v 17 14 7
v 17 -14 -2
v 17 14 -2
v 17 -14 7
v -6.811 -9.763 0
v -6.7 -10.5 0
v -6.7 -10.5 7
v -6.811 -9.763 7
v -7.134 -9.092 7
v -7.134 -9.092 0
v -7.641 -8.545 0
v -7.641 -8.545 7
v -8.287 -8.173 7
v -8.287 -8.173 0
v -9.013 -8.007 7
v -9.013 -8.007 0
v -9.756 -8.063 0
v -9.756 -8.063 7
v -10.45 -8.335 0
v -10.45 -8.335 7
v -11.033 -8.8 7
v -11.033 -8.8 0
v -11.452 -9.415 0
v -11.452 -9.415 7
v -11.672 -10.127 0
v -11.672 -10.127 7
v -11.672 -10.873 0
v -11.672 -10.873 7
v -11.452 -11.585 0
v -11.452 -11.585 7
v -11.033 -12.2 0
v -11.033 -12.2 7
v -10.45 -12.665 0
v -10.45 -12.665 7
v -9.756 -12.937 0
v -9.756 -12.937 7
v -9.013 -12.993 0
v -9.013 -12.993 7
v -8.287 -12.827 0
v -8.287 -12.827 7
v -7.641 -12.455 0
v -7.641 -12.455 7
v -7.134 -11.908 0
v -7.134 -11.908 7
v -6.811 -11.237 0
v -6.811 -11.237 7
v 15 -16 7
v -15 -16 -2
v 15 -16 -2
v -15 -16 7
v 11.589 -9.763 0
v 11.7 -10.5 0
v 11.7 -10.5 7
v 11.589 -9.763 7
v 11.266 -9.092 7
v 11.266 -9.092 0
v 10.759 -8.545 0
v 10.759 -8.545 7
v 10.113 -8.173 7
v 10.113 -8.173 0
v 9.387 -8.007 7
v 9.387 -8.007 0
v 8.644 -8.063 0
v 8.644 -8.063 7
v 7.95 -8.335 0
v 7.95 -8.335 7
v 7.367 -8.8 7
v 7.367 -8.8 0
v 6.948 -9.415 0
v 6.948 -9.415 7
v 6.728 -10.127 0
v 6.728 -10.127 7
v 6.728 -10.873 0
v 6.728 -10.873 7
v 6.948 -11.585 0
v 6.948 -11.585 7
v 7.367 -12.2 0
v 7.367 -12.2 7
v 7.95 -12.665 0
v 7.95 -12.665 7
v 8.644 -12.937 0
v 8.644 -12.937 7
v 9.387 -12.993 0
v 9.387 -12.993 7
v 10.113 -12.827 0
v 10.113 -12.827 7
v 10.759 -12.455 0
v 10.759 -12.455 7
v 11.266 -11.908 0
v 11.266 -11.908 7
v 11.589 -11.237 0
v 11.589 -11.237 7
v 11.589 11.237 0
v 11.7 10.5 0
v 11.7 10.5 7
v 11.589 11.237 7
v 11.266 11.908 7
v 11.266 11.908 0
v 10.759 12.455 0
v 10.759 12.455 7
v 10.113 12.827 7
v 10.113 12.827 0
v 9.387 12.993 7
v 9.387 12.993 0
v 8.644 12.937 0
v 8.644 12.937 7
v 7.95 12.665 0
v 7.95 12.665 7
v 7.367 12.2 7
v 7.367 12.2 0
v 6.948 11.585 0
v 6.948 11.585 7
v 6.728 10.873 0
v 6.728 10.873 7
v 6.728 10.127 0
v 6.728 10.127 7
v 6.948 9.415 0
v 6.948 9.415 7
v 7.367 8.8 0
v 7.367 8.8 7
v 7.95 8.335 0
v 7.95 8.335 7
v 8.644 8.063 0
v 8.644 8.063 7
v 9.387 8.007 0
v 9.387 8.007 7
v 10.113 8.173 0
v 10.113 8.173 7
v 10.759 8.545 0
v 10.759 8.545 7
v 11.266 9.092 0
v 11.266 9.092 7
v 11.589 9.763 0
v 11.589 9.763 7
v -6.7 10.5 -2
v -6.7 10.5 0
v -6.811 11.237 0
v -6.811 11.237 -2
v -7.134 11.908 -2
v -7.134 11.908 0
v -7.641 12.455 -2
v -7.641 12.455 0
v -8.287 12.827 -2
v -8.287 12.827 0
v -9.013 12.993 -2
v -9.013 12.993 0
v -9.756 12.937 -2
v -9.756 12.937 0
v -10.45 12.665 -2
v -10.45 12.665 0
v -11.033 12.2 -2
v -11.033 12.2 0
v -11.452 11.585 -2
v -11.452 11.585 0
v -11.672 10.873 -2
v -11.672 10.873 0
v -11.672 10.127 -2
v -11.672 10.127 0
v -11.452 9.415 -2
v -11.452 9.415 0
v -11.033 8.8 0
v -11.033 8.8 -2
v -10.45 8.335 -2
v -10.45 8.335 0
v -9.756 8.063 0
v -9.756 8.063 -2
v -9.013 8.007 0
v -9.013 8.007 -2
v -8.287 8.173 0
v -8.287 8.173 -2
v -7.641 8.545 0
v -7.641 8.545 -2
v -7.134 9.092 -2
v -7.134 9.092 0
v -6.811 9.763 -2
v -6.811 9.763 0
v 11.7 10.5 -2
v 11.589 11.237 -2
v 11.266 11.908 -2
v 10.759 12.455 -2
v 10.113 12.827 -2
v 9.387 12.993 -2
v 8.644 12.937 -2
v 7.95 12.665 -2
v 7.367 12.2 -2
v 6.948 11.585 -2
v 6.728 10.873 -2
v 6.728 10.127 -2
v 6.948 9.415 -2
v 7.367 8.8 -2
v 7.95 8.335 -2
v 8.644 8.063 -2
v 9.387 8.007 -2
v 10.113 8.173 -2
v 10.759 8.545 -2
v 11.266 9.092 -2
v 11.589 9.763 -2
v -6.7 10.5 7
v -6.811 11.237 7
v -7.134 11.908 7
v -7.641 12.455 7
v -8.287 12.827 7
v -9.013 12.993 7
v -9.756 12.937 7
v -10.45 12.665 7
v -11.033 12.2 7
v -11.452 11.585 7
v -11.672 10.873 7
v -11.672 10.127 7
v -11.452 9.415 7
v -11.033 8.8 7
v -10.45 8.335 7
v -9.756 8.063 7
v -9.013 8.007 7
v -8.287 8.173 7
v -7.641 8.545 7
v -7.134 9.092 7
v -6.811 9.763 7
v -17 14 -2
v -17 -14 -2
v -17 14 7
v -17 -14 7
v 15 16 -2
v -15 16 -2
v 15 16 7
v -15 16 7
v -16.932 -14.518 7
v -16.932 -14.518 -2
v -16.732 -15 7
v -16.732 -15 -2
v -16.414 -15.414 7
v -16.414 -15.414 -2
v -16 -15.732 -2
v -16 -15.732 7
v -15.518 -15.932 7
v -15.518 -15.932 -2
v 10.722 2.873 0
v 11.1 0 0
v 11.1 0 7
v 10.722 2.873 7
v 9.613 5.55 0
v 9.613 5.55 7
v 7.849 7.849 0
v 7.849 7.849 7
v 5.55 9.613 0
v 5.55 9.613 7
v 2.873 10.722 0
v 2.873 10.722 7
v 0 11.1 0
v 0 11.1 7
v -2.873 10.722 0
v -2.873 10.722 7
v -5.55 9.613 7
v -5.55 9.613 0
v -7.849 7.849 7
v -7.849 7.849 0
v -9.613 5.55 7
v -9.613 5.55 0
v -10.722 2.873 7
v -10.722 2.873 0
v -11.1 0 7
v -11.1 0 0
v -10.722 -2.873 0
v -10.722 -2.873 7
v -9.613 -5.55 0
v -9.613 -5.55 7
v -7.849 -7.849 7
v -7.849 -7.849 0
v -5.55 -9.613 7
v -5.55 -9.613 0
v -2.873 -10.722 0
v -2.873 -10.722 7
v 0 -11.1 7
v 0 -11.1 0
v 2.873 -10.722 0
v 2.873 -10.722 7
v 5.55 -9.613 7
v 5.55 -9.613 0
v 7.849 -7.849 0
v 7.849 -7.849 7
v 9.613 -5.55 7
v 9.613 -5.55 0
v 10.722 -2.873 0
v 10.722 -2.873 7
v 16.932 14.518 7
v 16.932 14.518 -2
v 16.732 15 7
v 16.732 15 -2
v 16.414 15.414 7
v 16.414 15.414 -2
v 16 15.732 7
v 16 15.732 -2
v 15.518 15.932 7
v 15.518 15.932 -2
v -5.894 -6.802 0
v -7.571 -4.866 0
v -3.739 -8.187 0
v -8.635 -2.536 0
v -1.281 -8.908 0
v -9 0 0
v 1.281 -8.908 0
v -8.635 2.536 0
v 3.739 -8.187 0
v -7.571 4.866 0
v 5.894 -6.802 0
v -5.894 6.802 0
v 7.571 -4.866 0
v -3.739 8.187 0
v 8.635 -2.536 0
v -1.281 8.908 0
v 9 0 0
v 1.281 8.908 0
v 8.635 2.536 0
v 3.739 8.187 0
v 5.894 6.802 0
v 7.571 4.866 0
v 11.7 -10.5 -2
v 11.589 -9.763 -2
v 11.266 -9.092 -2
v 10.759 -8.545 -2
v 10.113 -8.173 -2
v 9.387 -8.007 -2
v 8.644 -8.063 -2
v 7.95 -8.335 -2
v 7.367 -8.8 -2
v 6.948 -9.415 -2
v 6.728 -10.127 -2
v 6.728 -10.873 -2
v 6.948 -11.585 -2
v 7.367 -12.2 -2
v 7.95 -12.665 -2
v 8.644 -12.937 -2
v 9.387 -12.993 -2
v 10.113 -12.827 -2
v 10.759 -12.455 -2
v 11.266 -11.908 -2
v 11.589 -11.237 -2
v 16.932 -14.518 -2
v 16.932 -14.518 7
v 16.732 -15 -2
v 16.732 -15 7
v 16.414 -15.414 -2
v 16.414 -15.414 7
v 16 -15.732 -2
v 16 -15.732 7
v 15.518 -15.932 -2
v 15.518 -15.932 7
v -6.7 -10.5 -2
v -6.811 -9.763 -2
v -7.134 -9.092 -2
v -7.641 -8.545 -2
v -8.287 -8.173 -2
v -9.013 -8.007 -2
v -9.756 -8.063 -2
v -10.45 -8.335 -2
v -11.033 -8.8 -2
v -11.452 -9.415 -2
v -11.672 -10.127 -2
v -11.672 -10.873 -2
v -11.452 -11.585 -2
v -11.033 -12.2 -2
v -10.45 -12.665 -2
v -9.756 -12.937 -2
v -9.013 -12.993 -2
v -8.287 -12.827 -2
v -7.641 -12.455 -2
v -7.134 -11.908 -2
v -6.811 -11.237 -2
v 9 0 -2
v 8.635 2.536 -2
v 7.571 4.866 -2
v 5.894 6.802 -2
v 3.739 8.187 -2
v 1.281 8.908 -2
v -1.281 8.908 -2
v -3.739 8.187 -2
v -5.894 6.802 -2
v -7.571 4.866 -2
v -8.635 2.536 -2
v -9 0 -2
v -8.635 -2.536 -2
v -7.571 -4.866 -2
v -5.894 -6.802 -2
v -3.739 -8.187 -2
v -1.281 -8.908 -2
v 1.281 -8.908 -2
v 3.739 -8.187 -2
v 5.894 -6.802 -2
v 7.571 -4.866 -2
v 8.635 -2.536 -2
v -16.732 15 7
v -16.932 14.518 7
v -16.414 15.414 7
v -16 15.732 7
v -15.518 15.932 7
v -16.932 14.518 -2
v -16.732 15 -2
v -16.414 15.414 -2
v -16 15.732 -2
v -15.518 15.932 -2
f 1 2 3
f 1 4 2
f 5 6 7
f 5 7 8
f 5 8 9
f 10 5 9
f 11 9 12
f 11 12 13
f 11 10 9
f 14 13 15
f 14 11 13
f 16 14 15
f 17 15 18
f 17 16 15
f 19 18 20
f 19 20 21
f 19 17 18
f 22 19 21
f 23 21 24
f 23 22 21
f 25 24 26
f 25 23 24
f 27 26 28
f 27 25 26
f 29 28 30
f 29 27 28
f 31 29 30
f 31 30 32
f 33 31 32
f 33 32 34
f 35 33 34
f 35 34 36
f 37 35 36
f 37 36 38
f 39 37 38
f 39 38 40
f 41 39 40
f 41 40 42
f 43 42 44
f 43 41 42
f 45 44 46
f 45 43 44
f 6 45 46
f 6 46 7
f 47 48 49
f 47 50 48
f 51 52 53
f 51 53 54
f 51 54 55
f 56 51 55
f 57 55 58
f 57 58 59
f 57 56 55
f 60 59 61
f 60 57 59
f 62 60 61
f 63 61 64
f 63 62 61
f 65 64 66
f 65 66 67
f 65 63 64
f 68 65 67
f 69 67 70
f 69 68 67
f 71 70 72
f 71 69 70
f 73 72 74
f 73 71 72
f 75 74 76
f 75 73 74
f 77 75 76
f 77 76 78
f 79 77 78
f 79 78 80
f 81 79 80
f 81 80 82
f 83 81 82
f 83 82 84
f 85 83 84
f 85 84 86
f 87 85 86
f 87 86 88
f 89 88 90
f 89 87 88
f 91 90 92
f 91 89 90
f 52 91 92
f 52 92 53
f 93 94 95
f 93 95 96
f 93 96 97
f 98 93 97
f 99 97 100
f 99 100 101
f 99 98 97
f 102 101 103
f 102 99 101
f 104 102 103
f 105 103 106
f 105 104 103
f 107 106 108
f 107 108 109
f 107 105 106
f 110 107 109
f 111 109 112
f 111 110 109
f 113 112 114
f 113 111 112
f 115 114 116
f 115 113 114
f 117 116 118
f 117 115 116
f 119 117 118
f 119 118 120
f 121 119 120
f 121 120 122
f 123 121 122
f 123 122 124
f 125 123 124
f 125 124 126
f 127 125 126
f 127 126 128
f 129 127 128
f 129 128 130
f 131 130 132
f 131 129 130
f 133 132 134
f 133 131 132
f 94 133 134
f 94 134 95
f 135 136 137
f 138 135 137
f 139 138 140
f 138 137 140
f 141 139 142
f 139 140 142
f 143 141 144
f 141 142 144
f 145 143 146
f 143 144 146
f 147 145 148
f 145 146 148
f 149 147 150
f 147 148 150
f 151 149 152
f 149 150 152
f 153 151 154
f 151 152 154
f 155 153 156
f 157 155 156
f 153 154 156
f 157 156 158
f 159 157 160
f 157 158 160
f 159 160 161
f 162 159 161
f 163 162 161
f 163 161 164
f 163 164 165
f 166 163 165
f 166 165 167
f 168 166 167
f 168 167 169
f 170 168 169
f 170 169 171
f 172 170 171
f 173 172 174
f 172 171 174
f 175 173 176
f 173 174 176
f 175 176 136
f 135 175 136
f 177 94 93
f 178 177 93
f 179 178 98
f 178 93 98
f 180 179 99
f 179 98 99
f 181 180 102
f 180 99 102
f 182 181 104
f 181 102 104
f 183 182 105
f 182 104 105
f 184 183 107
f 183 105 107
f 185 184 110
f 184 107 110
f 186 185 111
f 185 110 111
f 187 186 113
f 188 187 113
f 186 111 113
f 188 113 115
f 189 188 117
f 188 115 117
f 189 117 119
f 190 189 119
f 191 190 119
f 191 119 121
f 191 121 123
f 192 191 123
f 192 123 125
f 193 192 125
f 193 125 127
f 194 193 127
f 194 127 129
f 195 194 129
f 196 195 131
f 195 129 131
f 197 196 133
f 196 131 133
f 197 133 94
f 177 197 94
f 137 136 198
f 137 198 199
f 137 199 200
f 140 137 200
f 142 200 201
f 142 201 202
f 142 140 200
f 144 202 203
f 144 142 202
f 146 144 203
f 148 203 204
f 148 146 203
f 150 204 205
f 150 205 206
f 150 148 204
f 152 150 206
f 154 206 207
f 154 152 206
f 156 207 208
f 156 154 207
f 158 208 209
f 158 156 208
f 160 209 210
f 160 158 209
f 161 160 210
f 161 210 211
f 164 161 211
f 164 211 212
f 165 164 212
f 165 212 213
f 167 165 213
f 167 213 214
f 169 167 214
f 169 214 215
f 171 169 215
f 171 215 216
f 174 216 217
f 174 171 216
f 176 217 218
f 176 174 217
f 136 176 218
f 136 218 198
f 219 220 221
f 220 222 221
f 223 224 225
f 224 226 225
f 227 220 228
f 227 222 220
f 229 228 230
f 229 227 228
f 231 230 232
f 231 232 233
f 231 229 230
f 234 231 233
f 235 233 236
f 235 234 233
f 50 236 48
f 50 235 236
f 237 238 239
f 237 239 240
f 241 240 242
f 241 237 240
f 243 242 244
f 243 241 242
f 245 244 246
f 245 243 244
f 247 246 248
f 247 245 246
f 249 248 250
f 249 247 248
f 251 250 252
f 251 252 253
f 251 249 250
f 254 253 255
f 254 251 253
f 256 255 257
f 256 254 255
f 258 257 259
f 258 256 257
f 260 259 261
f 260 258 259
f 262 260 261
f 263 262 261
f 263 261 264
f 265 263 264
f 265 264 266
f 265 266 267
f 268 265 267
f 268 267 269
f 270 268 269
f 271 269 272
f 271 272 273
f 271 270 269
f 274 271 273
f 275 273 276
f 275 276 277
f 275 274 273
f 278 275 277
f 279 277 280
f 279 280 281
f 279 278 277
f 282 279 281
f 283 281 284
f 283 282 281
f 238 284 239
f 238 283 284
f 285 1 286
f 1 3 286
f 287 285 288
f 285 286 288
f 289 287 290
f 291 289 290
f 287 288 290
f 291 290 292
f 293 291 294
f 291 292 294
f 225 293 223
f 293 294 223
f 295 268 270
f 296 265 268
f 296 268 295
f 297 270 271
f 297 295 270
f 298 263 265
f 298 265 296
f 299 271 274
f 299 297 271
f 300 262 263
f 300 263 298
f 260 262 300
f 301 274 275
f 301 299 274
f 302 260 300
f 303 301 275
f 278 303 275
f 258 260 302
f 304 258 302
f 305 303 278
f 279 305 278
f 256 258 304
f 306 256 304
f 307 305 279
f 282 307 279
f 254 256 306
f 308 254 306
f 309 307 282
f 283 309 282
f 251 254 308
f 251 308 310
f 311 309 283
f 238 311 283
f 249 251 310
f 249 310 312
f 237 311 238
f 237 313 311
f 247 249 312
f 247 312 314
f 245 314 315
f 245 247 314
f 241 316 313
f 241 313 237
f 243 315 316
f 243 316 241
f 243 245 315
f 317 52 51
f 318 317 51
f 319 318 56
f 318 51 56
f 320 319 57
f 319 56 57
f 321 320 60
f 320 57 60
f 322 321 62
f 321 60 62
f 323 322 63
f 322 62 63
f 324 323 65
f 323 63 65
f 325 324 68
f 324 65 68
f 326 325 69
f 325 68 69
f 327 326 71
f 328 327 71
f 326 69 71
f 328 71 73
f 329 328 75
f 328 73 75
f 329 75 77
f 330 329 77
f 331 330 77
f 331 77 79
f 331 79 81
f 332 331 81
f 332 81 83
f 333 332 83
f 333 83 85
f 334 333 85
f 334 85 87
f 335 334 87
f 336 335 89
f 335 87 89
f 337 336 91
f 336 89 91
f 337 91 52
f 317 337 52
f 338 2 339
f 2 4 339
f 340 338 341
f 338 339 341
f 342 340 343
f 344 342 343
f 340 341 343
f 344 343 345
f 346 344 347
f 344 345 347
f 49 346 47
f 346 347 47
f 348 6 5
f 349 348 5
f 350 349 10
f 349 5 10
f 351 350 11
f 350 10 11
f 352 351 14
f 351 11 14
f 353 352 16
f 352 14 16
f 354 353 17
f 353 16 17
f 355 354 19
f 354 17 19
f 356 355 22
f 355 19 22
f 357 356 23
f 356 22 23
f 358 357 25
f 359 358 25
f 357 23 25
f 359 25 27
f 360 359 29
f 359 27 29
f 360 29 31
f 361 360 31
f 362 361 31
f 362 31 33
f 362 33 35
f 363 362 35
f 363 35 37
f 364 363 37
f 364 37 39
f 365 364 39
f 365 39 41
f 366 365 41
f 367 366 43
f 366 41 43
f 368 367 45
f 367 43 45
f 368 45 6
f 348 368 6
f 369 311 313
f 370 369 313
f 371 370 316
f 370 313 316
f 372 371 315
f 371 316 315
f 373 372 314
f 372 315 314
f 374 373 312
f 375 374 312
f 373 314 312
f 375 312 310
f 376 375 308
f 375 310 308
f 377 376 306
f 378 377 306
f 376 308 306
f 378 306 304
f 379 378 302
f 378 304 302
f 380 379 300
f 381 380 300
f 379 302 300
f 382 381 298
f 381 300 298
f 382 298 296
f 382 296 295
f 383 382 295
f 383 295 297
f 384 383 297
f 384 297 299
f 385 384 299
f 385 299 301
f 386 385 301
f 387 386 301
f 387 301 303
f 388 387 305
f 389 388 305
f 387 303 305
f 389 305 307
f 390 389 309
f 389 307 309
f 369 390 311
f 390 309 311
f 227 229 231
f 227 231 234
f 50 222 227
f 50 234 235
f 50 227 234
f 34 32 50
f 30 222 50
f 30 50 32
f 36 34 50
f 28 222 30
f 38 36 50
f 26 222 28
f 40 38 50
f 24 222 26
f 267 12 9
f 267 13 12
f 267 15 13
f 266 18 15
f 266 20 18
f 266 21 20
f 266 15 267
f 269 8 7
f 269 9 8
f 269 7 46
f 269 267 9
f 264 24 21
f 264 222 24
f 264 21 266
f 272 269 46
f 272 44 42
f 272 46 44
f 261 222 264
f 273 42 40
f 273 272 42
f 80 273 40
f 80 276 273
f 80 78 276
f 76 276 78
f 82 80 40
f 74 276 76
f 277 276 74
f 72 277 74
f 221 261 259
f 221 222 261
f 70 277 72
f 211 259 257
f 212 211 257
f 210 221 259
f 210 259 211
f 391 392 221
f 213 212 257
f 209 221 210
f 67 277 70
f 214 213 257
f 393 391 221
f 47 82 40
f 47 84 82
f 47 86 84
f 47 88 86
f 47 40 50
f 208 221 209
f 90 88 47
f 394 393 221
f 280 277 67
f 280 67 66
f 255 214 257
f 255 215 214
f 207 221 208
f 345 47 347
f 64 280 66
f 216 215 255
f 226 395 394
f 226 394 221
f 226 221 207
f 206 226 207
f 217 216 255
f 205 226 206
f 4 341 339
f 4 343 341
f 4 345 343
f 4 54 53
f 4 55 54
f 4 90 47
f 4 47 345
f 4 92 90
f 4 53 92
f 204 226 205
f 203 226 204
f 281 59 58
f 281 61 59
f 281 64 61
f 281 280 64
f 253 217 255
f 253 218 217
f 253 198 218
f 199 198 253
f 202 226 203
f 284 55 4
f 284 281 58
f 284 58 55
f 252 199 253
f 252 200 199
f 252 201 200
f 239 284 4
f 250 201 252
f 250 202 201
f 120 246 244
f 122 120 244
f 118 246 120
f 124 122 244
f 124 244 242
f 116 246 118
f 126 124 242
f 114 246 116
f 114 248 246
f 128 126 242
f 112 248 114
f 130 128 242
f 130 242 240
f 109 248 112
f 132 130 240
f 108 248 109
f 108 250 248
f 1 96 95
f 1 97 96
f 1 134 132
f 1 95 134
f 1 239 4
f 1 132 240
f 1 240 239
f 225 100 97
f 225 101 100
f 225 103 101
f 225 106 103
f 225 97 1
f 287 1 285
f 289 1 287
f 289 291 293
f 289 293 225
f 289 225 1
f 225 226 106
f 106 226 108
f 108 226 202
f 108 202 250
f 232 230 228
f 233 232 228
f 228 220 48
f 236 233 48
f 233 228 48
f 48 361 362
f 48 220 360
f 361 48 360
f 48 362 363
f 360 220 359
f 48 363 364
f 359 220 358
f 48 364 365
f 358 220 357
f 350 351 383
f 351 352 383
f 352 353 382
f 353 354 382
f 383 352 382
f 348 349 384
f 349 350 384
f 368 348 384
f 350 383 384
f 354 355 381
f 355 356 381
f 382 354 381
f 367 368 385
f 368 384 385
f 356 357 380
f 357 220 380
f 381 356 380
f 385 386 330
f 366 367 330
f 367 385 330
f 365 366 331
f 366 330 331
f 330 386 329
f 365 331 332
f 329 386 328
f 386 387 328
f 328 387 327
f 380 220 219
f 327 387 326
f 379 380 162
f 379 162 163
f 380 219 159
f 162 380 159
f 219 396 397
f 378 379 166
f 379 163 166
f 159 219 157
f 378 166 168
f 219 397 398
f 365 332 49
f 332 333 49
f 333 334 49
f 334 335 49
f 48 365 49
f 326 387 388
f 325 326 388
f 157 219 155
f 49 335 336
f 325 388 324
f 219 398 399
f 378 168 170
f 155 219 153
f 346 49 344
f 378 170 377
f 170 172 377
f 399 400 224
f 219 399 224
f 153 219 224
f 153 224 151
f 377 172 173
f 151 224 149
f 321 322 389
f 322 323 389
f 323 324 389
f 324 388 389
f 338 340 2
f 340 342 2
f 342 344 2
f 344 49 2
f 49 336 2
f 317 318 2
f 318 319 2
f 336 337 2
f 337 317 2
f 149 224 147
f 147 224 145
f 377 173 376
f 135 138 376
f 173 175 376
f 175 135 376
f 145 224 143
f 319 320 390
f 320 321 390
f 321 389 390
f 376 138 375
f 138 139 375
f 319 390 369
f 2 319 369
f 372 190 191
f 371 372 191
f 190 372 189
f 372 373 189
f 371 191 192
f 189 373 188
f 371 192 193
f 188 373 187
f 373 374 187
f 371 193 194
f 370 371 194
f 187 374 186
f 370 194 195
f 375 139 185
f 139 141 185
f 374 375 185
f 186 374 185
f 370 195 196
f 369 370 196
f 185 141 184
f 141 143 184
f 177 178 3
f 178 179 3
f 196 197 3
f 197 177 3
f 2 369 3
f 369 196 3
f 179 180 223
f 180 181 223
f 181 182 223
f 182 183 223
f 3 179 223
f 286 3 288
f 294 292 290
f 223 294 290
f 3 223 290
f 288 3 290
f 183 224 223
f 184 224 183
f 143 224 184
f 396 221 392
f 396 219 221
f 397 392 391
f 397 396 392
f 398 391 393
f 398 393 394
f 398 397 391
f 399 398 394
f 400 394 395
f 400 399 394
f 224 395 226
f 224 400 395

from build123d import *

# Parameters (mm, degrees)
SKETCH_W      = 34
SKETCH_H      = 32
SKETCH_R      = 2.5
SKETCH_R_2    = 11.1
PAD_DEPTH     = 7
SKETCH001_W   = 34
SKETCH001_H   = 32
SKETCH001_R   = 2.5
SKETCH001_R_2 = 9
PAD001_DEPTH  = 2
FILLET_R      = 2


with BuildPart() as part:
    # Sketch → Pad (new body)
    with BuildSketch(Plane.XY):
        Rectangle(SKETCH_W, SKETCH_H)
        with Locations((-9.2, 10.5)):
            Circle(SKETCH_R, mode=Mode.SUBTRACT)
        with Locations((9.2, 10.5)):
            Circle(SKETCH_R, mode=Mode.SUBTRACT)
        with Locations((-9.2, -10.5)):
            Circle(SKETCH_R, mode=Mode.SUBTRACT)
        with Locations((9.2, -10.5)):
            Circle(SKETCH_R, mode=Mode.SUBTRACT)
        Circle(SKETCH_R_2, mode=Mode.SUBTRACT)
    extrude(amount=PAD_DEPTH)

    # Sketch001 → Pad001 (join)
    with BuildSketch(Plane.XY):
        Rectangle(SKETCH001_W, SKETCH001_H)
        with Locations((-9.2, 10.5)):
            Circle(SKETCH001_R, mode=Mode.SUBTRACT)
        with Locations((9.2, 10.5)):
            Circle(SKETCH001_R, mode=Mode.SUBTRACT)
        with Locations((-9.2, -10.5)):
            Circle(SKETCH001_R, mode=Mode.SUBTRACT)
        with Locations((9.2, -10.5)):
            Circle(SKETCH001_R, mode=Mode.SUBTRACT)
        Circle(SKETCH001_R_2, mode=Mode.SUBTRACT)
    extrude(amount=-PAD001_DEPTH)

    # Fillet
    fillet_edges = [part.edges().sort_by_distance(p)[0] for p in [
        (17, -16, -1),
        (17, -16, 3.5),
        (-17, -16, -1),
        (-17, -16, 3.5),
        (17, 16, 3.5),
        (17, 16, -1),
        (-17, 16, 3.5),
        (-17, 16, -1),
    ]]
    fillet(fillet_edges, radius=FILLET_R)


solid = part.part
